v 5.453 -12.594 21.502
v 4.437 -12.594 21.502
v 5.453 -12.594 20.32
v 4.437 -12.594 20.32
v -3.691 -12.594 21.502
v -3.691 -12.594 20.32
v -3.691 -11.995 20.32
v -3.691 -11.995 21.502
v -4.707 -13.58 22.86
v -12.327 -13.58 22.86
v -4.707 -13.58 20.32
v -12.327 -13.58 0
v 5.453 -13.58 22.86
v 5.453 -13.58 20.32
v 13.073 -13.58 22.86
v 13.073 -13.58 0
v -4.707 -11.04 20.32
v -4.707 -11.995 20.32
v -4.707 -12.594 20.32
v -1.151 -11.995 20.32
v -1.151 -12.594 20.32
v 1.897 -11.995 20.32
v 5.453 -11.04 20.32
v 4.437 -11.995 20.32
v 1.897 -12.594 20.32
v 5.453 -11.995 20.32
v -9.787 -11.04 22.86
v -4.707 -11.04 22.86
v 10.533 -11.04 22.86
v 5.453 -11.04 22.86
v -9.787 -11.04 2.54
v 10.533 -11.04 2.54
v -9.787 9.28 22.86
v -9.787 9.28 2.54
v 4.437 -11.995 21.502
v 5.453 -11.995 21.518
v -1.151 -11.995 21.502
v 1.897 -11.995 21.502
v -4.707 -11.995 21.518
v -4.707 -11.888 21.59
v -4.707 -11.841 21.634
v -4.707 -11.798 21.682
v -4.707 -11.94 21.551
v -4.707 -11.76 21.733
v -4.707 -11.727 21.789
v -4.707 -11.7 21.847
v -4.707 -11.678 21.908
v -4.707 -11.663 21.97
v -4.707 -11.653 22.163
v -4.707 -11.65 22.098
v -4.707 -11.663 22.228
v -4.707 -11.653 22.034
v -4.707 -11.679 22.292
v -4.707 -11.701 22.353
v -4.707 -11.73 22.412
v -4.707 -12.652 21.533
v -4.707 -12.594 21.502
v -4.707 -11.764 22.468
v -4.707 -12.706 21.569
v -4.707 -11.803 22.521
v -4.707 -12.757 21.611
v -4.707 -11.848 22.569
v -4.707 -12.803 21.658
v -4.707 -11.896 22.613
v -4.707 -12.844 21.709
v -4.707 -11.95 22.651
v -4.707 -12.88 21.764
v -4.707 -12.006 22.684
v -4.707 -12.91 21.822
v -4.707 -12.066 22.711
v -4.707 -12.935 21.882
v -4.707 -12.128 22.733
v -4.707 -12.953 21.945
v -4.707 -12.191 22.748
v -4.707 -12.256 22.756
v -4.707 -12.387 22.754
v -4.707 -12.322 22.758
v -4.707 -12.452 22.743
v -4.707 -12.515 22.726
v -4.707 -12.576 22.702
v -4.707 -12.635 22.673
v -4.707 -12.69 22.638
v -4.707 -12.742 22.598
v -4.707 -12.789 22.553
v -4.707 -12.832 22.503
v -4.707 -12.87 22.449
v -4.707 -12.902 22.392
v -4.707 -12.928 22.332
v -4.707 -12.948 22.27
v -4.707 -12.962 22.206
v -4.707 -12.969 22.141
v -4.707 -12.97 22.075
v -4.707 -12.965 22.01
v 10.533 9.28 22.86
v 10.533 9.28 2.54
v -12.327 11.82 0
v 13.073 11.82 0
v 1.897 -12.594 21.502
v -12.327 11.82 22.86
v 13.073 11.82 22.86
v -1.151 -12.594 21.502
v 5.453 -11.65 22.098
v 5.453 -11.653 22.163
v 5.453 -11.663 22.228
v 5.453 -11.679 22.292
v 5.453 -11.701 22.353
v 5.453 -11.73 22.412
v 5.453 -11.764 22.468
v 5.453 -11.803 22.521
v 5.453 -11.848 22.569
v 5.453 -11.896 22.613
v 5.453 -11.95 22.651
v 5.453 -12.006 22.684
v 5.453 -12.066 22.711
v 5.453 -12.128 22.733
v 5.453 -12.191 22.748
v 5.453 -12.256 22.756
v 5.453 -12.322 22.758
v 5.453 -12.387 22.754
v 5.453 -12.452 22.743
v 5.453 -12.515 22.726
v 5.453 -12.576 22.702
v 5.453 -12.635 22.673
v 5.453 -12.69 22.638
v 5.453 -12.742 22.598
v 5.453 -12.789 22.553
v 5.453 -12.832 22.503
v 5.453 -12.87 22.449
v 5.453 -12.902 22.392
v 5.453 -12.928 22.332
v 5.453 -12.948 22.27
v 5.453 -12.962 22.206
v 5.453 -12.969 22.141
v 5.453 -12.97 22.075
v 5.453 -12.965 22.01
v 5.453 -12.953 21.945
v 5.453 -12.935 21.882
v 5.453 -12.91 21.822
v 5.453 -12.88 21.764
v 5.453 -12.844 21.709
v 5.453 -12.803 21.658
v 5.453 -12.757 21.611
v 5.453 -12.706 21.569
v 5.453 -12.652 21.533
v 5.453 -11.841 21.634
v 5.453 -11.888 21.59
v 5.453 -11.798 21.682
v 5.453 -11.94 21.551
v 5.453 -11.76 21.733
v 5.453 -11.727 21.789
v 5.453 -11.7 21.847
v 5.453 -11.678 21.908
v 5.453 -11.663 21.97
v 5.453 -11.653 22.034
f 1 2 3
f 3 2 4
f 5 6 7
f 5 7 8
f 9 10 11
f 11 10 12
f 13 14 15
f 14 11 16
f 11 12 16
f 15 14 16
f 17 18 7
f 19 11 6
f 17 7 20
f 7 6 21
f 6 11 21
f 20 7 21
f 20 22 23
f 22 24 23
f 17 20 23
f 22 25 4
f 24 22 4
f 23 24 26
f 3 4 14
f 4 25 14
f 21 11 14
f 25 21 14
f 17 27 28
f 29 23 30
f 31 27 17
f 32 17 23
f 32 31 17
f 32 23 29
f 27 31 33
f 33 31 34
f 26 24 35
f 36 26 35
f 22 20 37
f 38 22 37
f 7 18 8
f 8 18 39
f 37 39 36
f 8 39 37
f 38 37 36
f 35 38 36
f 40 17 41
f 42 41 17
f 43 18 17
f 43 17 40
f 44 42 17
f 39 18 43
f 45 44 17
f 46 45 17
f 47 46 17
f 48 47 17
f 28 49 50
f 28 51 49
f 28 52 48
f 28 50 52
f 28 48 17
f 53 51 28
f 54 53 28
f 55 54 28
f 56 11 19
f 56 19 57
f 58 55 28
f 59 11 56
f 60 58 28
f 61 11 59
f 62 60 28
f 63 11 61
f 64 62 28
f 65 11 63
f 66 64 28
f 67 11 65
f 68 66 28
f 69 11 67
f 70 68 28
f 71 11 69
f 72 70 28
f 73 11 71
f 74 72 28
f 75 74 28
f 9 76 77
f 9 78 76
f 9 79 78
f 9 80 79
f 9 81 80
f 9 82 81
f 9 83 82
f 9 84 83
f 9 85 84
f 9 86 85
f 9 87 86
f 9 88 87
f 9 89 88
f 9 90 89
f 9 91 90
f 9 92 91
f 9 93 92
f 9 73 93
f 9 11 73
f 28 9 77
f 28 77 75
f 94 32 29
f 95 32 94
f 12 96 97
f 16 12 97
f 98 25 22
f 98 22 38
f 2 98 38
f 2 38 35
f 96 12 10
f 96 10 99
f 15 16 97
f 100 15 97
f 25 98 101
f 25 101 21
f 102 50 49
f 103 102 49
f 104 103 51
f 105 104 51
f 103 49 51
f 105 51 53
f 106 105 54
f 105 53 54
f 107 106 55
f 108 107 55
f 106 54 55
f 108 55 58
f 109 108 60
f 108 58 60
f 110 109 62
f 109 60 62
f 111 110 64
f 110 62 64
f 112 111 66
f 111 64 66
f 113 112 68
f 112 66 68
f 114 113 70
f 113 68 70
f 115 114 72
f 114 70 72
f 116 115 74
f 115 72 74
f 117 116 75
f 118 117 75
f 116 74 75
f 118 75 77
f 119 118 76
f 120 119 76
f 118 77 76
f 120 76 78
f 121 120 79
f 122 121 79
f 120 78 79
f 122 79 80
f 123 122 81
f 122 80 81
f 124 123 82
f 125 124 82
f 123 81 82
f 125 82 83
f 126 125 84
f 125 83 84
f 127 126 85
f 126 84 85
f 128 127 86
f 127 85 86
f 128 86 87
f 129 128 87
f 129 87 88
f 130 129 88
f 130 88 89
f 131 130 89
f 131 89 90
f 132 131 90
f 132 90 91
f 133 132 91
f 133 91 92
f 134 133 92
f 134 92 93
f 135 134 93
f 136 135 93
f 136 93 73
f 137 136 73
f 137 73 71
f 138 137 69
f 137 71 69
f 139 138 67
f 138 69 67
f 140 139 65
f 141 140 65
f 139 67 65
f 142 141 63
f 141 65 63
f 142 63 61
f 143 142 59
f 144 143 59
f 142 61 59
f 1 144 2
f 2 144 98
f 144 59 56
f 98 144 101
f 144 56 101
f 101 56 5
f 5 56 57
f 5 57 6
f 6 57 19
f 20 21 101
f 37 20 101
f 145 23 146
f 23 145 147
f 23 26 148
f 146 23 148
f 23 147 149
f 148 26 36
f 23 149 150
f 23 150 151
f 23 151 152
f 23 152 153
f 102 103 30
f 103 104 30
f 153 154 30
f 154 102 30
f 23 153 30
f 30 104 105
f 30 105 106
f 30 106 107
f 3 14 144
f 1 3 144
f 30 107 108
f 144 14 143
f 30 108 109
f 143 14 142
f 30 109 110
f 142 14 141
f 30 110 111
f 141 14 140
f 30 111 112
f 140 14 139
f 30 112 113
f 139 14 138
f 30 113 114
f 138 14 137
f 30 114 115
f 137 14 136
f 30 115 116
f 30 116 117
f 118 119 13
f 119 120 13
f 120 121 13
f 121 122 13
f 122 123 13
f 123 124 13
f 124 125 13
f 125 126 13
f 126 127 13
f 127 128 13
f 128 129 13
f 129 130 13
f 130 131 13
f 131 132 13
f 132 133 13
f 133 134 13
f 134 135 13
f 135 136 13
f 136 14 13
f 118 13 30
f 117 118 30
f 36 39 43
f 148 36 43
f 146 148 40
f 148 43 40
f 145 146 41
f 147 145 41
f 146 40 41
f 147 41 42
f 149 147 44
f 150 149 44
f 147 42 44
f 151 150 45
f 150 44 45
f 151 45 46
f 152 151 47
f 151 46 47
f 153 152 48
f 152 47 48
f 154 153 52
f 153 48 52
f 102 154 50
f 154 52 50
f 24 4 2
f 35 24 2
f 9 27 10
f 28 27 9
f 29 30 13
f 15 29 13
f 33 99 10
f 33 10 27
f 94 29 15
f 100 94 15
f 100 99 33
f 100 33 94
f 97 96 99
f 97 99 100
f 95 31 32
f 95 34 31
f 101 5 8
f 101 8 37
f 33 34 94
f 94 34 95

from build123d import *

# Parameters (mm, degrees)
F0_W     = 25.4
F0_H     = 25.4
F0_W_2   = 20.32
F0_H_2   = 20.32
F1_DEPTH = 2.54
F2_DEPTH = 22.86
F3_W     = 10.16
F3_H     = 2.54
F4_DEPTH = 2.54
F6_DEPTH = 10.16
F7_W     = 2.54
F7_H     = 1.1816583352
F8_DEPTH = 2.54


with BuildPart() as f1:
    # F0 (on Top) → F1 (new body)
    with BuildSketch(Plane.XY):
        with Locations((0.373007264, -0.8804095839)):
            Rectangle(F0_W, F0_H)
        with Locations((0.373007264, -0.8804095839)):
            Rectangle(F0_W_2, F0_H_2, mode=Mode.SUBTRACT)
        with Locations((0.373007264, -0.8804095839)):
            Rectangle(F0_W_2, F0_H_2)
    extrude(amount=F1_DEPTH)

    # F0 (on Top) → F2 (join)
    with BuildSketch(Plane.XY):
        with Locations((0.373007264, -0.8804095839)):
            Rectangle(F0_W, F0_H)
        with Locations((0.373007264, -0.8804095839)):
            Rectangle(F0_W_2, F0_H_2, mode=Mode.SUBTRACT)
    extrude(amount=F2_DEPTH)

    # F3 (on face) → F4 (cut)
    with BuildSketch(Plane.XZ.offset(13.5804095839)):
        with Locations((0.373007264, 21.59)):
            Rectangle(F3_W, F3_H)
    extrude(amount=-F4_DEPTH, mode=Mode.SUBTRACT)

    # F5 (on face) → F6 (join)
    with BuildSketch(Plane.YZ.offset(-4.706992736)):
        with BuildLine():
            ThreePointArc((-11.9946550142, 21.5179765421), (-11.742671758, 21.7606545967), (-11.6500095839, 22.098))
            ThreePointArc((-11.6500095839, 22.098), (-12.6630783121, 22.6563483931), (-12.5941432245, 21.5016583352))
            ThreePointArc((-12.5941432245, 21.5016583352), (-12.29244, 21.4378445228), (-11.9946550142, 21.5179765421))
        make_face()
        with BuildLine():
            ThreePointArc((-11.9946550142, 21.5179765421), (-12.29244, 21.4378445228), (-12.5941432245, 21.5016583352))
            Line((-12.5941432245, 21.5016583352), (-12.5941432245, 21.4954577436))
            Line((-12.5941432245, 21.4954577436), (-12.5941432245, 20.32))
            Line((-12.5941432245, 20.32), (-11.9946550142, 20.32))
            Line((-11.9946550142, 20.32), (-11.9946550142, 21.4800578359))
            Line((-11.9946550142, 21.4800578359), (-11.9946550142, 21.5179765421))
        make_face()
    extrude(amount=F6_DEPTH)

    # F7 (on face) → F8 (cut)
    with BuildSketch(Plane.XZ.offset(12.5941432245)):
        with Locations((-2.420992736, 20.9108291676)):
            Rectangle(F7_W, F7_H)
        with Locations((3.167007264, 20.9108291676)):
            Rectangle(F7_W, F7_H)
    extrude(amount=-F8_DEPTH, mode=Mode.SUBTRACT)


solid = f1.part
